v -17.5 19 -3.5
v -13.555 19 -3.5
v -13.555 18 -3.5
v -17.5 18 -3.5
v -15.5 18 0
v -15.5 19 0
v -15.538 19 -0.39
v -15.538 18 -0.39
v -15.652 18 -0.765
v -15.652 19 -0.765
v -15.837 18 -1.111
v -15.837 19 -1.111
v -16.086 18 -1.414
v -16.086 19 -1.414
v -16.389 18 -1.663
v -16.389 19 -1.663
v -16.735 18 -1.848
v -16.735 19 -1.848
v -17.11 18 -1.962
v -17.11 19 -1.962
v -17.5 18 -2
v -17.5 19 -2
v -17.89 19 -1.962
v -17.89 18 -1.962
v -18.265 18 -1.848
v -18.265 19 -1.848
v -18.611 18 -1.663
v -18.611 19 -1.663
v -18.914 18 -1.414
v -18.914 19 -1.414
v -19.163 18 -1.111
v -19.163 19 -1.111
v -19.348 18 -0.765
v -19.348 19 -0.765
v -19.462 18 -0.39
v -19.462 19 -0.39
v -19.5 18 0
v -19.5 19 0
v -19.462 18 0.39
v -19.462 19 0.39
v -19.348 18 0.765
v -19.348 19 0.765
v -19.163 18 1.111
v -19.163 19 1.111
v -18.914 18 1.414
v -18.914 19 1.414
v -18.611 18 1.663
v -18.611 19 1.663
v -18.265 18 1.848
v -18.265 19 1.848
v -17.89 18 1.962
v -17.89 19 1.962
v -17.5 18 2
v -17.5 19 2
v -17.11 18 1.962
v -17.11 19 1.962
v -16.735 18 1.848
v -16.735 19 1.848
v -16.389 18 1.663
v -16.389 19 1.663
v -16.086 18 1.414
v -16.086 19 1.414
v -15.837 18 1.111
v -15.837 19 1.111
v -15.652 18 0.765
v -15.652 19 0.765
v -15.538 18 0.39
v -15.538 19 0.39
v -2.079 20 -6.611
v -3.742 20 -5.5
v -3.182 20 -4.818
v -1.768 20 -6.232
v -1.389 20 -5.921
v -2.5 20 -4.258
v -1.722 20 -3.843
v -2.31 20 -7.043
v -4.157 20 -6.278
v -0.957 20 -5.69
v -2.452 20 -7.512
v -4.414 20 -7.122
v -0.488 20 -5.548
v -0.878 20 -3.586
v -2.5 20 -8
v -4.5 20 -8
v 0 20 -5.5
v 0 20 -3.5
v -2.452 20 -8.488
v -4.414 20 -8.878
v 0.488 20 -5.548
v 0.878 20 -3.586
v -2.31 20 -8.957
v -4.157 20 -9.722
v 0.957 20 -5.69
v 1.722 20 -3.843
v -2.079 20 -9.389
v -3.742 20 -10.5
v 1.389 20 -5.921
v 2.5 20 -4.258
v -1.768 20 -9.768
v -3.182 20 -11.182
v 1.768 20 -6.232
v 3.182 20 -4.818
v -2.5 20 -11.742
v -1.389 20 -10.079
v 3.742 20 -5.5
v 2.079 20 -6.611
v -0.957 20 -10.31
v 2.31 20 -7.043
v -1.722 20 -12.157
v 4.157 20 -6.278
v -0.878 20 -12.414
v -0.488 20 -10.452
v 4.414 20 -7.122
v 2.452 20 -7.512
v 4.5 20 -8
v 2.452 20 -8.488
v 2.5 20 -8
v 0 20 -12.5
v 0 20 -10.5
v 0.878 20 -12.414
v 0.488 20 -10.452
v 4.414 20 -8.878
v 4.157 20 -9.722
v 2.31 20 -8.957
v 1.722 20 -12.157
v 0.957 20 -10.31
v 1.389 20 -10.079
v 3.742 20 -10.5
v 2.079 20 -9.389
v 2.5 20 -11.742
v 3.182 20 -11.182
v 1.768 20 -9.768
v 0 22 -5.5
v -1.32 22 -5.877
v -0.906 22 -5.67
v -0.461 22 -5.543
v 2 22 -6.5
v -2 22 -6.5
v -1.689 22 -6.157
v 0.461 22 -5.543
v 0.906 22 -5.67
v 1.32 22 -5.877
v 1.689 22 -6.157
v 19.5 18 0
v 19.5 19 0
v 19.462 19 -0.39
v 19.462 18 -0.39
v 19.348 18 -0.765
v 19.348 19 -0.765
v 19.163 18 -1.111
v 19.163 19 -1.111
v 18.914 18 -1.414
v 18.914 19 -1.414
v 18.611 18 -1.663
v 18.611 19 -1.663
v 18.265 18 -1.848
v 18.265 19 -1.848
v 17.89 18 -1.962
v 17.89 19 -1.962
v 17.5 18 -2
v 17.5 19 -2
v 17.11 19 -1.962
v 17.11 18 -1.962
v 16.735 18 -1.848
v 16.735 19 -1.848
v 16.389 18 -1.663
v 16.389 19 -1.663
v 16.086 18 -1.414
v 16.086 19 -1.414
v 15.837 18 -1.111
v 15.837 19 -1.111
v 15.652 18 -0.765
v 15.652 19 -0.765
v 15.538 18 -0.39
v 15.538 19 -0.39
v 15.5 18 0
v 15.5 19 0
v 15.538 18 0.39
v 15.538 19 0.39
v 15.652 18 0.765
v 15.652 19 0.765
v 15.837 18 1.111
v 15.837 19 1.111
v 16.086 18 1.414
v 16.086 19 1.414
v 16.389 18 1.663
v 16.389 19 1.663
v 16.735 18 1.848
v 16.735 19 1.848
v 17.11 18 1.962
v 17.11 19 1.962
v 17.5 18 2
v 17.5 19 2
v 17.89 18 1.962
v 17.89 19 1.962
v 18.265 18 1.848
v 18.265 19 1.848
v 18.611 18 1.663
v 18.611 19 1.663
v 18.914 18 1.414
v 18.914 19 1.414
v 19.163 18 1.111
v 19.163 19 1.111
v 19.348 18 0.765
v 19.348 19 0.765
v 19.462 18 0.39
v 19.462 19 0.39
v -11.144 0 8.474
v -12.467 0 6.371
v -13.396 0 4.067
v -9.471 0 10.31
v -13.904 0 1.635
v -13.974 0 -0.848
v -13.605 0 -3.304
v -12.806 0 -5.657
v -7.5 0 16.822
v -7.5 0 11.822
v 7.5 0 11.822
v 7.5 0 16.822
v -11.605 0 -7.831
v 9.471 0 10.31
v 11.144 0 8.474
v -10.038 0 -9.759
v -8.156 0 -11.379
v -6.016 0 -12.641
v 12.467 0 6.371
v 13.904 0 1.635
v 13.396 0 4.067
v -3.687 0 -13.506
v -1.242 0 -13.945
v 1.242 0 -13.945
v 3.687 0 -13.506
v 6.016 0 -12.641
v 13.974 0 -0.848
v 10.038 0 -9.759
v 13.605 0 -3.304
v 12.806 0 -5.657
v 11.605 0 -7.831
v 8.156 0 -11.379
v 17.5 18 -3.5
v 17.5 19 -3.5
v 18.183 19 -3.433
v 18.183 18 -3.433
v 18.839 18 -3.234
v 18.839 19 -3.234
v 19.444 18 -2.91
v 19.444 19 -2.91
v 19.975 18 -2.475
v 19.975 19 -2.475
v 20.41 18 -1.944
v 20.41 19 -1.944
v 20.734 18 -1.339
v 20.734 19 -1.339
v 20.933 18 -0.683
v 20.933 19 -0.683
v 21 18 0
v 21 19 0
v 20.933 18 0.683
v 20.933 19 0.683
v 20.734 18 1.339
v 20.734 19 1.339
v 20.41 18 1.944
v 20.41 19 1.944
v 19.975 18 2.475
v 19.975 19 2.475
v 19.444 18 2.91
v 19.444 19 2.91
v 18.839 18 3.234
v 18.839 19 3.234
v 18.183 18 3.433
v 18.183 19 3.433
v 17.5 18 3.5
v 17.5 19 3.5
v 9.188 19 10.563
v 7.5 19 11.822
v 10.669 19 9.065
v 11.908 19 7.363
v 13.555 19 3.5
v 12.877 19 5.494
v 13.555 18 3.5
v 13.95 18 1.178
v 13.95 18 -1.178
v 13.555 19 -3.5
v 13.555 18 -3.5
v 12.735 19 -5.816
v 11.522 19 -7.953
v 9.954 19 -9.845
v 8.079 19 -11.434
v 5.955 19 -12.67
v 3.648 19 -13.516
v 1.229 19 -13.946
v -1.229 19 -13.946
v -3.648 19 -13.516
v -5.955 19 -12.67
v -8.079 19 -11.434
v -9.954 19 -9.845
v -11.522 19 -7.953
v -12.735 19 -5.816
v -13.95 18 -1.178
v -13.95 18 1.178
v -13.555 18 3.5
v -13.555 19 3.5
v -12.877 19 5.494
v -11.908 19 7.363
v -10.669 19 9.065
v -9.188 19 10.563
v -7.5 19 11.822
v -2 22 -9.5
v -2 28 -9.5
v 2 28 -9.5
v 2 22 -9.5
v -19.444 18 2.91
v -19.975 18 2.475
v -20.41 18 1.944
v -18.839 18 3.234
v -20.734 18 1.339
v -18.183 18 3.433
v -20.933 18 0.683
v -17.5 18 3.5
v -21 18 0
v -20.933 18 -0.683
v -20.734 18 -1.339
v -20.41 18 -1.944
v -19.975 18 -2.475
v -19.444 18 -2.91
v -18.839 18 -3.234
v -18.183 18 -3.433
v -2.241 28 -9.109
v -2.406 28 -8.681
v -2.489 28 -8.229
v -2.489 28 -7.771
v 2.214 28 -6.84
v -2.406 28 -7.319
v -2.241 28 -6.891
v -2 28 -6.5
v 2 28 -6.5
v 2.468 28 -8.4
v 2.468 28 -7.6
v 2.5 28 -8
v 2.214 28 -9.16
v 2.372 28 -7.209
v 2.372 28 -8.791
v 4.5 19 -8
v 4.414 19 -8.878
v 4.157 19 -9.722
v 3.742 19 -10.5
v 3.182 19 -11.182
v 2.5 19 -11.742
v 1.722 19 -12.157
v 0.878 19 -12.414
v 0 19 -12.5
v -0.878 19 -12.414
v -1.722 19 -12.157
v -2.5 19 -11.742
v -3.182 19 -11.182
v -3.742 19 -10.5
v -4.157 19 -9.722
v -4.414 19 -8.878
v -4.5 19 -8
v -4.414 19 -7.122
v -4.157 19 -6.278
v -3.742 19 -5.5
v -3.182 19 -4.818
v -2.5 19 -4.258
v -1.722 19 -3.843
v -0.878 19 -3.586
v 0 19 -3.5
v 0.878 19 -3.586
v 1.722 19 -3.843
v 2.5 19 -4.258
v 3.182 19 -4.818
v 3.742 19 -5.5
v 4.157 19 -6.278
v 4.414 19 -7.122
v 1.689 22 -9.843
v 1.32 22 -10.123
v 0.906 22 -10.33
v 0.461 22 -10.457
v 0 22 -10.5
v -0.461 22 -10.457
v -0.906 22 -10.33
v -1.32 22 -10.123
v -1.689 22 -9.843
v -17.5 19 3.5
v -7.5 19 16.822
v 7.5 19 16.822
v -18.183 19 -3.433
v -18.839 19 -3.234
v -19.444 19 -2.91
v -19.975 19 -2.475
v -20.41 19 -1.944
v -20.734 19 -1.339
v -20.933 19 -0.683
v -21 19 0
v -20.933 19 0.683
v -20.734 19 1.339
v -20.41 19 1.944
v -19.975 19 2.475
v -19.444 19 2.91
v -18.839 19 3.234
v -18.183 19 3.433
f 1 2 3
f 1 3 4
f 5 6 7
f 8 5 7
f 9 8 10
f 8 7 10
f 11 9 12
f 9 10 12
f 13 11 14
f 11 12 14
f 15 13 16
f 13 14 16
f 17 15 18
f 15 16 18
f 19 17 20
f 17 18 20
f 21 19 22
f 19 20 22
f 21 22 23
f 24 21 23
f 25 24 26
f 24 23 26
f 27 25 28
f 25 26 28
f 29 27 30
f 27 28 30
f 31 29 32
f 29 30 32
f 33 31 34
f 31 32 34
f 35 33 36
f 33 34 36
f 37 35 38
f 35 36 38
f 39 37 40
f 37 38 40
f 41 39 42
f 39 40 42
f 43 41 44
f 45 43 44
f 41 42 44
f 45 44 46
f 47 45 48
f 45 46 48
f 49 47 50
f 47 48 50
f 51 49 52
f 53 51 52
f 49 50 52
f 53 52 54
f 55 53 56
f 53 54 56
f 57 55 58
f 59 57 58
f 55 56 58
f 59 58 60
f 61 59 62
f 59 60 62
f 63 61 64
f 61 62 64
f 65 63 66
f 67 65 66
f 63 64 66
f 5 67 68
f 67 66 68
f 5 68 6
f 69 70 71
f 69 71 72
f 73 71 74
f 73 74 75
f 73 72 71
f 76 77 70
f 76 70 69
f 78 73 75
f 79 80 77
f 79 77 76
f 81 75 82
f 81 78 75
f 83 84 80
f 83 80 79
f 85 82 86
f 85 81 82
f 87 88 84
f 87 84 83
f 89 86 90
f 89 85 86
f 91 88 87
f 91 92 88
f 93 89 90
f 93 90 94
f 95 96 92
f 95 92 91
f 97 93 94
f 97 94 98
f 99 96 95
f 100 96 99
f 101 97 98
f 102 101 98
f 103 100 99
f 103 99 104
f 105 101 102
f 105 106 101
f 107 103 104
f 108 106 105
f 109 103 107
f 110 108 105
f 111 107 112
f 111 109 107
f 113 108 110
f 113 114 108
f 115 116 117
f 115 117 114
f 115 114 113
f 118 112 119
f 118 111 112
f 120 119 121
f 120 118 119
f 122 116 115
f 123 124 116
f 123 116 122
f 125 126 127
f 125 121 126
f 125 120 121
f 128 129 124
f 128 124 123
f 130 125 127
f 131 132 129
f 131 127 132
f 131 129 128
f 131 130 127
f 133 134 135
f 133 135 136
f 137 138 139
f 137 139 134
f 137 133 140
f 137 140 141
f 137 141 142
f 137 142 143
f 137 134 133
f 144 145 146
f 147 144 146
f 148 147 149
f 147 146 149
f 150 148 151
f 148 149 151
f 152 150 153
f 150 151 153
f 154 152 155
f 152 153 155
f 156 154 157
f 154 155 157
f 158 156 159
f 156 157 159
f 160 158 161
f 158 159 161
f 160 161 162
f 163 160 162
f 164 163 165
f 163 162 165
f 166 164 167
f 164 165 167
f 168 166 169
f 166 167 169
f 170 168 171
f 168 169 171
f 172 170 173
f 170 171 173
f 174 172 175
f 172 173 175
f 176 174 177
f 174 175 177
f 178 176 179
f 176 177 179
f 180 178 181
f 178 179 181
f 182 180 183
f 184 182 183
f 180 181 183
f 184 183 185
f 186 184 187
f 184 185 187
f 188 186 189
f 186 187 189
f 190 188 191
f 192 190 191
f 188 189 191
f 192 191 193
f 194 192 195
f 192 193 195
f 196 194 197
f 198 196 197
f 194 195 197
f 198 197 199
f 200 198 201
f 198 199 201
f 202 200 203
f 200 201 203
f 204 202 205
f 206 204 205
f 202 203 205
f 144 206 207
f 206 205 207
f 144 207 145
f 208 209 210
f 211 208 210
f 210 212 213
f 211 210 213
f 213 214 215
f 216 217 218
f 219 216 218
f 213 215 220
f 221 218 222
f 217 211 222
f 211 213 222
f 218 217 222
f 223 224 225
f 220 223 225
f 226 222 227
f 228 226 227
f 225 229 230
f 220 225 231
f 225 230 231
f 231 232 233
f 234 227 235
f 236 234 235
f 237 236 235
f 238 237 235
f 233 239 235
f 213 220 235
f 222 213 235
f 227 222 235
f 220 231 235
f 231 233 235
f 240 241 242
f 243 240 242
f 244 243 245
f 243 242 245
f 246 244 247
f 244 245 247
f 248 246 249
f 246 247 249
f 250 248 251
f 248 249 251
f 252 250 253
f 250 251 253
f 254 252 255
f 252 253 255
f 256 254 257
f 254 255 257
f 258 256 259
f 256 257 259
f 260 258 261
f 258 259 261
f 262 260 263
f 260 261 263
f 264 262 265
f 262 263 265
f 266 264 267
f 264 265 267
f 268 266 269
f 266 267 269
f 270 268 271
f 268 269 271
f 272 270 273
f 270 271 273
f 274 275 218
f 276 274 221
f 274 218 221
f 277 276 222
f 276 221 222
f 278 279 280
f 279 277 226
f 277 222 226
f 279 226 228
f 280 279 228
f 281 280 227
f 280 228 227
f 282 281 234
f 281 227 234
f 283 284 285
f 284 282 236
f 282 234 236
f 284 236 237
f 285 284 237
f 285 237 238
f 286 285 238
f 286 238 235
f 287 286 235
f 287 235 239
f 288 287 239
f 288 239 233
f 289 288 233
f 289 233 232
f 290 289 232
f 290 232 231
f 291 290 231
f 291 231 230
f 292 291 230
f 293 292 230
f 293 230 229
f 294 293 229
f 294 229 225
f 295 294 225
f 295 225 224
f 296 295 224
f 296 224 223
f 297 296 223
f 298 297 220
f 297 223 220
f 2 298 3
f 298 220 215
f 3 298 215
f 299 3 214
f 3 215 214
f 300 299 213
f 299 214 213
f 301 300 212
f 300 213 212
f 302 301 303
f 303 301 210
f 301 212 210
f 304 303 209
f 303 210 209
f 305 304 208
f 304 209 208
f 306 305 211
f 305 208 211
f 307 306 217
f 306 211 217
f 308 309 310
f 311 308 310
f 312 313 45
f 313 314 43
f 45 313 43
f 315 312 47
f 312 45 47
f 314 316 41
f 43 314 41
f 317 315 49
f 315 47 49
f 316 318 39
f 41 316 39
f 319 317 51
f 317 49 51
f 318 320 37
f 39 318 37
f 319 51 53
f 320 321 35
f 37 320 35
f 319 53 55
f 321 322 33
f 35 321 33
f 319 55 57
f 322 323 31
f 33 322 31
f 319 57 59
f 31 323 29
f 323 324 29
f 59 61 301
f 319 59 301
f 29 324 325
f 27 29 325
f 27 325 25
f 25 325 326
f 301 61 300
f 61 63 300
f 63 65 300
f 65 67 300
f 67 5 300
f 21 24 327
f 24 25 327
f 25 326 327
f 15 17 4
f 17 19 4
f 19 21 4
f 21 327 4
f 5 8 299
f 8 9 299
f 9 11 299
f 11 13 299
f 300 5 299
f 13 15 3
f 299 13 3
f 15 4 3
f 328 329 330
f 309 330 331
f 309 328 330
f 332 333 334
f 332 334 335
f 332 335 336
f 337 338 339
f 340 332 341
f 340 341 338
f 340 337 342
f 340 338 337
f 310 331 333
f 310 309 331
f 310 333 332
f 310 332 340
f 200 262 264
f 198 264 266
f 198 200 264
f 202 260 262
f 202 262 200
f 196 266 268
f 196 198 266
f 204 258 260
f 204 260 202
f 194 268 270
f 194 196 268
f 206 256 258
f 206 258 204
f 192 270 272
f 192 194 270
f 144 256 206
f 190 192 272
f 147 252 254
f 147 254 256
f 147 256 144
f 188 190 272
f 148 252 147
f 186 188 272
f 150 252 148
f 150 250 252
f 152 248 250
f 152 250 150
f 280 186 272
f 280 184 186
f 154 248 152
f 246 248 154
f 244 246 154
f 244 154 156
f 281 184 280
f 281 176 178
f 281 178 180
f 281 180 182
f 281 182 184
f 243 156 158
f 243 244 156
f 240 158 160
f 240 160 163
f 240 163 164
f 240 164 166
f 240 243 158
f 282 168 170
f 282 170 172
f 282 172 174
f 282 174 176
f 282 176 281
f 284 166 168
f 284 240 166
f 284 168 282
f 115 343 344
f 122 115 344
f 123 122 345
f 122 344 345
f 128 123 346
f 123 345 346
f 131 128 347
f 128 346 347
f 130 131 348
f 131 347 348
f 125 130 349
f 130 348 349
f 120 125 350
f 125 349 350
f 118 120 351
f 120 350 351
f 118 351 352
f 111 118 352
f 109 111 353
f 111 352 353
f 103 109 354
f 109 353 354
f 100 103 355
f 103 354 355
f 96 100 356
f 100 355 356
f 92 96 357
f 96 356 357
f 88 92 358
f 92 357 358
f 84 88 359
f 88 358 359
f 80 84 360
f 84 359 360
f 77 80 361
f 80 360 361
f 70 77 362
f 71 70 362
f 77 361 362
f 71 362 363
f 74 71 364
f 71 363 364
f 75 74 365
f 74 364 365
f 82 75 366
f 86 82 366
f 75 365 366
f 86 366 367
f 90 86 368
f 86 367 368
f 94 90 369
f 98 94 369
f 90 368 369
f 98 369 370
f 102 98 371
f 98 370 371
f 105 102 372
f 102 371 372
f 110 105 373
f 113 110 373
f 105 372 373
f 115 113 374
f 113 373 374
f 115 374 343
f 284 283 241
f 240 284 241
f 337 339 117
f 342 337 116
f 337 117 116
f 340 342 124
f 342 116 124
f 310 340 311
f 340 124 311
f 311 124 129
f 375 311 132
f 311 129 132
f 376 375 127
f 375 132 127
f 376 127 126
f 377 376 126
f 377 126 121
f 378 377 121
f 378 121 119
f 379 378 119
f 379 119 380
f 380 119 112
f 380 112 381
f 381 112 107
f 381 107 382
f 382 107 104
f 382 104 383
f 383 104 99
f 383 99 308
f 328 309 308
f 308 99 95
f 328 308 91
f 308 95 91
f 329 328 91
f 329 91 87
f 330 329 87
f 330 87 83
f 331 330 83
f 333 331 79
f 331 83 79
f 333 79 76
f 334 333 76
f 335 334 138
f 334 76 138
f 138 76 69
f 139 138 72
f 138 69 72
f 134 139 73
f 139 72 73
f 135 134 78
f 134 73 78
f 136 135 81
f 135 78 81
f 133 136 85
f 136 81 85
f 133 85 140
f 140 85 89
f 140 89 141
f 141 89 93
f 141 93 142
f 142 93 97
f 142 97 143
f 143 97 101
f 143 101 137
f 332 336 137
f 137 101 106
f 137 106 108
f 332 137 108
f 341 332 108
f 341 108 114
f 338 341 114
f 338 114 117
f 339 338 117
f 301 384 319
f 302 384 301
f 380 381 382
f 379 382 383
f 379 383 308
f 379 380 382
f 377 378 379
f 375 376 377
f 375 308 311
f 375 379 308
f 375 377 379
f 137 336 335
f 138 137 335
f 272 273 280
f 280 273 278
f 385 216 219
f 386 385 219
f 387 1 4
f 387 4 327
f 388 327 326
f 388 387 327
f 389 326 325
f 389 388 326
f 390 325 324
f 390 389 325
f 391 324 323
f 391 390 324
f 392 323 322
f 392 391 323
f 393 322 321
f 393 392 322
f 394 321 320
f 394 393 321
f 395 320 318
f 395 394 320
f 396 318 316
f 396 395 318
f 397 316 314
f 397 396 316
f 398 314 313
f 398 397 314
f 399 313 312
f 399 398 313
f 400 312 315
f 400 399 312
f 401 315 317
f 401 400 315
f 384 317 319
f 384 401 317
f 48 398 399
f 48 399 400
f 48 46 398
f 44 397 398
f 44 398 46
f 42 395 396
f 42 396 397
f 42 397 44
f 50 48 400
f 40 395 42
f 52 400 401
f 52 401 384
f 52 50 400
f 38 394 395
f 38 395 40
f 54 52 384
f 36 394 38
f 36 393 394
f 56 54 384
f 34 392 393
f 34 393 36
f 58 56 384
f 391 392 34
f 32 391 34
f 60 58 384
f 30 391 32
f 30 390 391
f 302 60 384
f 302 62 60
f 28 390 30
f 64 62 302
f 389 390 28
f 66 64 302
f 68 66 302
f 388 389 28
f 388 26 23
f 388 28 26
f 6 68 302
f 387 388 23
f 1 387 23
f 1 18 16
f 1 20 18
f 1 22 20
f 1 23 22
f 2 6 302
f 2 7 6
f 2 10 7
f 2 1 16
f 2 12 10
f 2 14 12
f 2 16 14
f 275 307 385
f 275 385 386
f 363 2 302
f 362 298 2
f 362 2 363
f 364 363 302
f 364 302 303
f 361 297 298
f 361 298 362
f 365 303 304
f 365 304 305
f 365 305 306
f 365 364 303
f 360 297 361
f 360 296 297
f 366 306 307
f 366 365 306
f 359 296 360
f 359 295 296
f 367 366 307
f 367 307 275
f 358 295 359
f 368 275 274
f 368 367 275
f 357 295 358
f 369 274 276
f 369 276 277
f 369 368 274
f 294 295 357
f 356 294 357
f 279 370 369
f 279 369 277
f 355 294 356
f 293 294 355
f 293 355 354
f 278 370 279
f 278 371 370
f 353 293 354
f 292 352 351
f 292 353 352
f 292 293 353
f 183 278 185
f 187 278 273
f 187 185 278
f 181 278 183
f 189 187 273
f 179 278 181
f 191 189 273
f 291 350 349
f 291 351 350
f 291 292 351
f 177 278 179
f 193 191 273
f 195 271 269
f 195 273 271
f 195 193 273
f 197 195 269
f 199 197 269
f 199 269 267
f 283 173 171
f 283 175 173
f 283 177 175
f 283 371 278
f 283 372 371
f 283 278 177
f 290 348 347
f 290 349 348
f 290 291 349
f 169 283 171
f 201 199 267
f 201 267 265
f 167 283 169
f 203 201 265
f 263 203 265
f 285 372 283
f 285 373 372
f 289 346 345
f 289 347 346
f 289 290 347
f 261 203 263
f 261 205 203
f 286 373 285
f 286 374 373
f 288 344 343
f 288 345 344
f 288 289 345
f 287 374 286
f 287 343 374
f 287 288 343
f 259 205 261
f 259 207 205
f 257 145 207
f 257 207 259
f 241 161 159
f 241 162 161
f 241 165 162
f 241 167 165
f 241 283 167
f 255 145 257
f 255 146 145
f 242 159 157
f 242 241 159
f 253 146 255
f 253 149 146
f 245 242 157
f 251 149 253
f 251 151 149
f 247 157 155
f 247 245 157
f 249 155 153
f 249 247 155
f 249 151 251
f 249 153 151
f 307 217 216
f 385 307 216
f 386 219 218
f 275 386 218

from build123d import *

# Parameters (mm, degrees)
BOSS_EXTRU_1_DEPTH      = 19
ESQUISSE2_R             = 2
BOSS_EXTRU_2_DEPTH      = 1
ESQUISSE3_R             = 4.5
BOSS_EXTRU_3_DEPTH      = 1
ESQUISSE4_R             = 2.5
BOSS_EXTRU_4_DEPTH      = 8
ENL_V_MAT_EXTRU_1_DEPTH = 6


with BuildPart() as part:
    # Esquisse1 → Boss.-Extru.1 (new body)
    with BuildSketch(Plane(origin=(0, 0, 0), x_dir=(1, 0, 0), z_dir=(0, 1, 0))):
        with BuildLine():
            Line((-7.5, -11.821590418), (-7.5, -16.821590418))
            Line((-7.5, -16.821590418), (7.5, -16.821590418))
            Line((7.5, -16.821590418), (7.5, -11.821590418))
            ThreePointArc((7.5, -11.821590418), (0, 14), (-7.5, -11.821590418))
        make_face()
    extrude(amount=BOSS_EXTRU_1_DEPTH)

    # Esquisse2 → Boss.-Extru.2 (add)
    with BuildSketch(Plane(origin=(0, 19, 0), x_dir=(1, 0, 0), z_dir=(0, 1, 0))):
        with BuildLine():
            Line((13.555441712, 3.5), (17.5, 3.5))
            ThreePointArc((17.5, 3.5), (21, 0), (17.5, -3.5))
            Line((17.5, -3.5), (13.555441712, -3.5))
            ThreePointArc((13.555441712, -3.5), (14, 0), (13.555441712, 3.5))
        make_face()
        with Locations((17.5, 0)):
            Circle(ESQUISSE2_R, mode=Mode.SUBTRACT)
        with BuildLine():
            Line((-17.5, -3.5), (-13.555441712, -3.5))
            ThreePointArc((-13.555441712, -3.5), (-14, 0), (-13.555441712, 3.5))
            Line((-13.555441712, 3.5), (-17.5, 3.5))
            ThreePointArc((-17.5, 3.5), (-21, 0), (-17.5, -3.5))
        make_face()
        with Locations((-17.5, 0)):
            Circle(ESQUISSE2_R, mode=Mode.SUBTRACT)
    extrude(amount=-BOSS_EXTRU_2_DEPTH)

    # Esquisse3 → Boss.-Extru.3 (add)
    with BuildSketch(Plane(origin=(0, 19, 0), x_dir=(1, 0, 0), z_dir=(0, 1, 0))):
        with Locations((0, 8)):
            Circle(ESQUISSE3_R)
    extrude(amount=BOSS_EXTRU_3_DEPTH)

    # Esquisse4 → Boss.-Extru.4 (add)
    with BuildSketch(Plane(origin=(0, 20, 0), x_dir=(1, 0, 0), z_dir=(0, 1, 0))):
        with Locations((0, 8)):
            Circle(ESQUISSE4_R)
    extrude(amount=BOSS_EXTRU_4_DEPTH)

    # Esquisse5 → Enlèv. mat.-Extru.1 (cut)
    with BuildSketch(Plane(origin=(0, 28, 0), x_dir=(1, 0, 0), z_dir=(0, 1, 0))):
        with BuildLine():
            Line((2, 6.5), (-2, 6.5))
            ThreePointArc((-2, 6.5), (0, 5.5), (2, 6.5))
        make_face()
        with BuildLine():
            ThreePointArc((2, 9.5), (0, 10.5), (-2, 9.5))
            Line((-2, 9.5), (2, 9.5))
        make_face()
    extrude(amount=-ENL_V_MAT_EXTRU_1_DEPTH, mode=Mode.SUBTRACT)


solid = part.part
